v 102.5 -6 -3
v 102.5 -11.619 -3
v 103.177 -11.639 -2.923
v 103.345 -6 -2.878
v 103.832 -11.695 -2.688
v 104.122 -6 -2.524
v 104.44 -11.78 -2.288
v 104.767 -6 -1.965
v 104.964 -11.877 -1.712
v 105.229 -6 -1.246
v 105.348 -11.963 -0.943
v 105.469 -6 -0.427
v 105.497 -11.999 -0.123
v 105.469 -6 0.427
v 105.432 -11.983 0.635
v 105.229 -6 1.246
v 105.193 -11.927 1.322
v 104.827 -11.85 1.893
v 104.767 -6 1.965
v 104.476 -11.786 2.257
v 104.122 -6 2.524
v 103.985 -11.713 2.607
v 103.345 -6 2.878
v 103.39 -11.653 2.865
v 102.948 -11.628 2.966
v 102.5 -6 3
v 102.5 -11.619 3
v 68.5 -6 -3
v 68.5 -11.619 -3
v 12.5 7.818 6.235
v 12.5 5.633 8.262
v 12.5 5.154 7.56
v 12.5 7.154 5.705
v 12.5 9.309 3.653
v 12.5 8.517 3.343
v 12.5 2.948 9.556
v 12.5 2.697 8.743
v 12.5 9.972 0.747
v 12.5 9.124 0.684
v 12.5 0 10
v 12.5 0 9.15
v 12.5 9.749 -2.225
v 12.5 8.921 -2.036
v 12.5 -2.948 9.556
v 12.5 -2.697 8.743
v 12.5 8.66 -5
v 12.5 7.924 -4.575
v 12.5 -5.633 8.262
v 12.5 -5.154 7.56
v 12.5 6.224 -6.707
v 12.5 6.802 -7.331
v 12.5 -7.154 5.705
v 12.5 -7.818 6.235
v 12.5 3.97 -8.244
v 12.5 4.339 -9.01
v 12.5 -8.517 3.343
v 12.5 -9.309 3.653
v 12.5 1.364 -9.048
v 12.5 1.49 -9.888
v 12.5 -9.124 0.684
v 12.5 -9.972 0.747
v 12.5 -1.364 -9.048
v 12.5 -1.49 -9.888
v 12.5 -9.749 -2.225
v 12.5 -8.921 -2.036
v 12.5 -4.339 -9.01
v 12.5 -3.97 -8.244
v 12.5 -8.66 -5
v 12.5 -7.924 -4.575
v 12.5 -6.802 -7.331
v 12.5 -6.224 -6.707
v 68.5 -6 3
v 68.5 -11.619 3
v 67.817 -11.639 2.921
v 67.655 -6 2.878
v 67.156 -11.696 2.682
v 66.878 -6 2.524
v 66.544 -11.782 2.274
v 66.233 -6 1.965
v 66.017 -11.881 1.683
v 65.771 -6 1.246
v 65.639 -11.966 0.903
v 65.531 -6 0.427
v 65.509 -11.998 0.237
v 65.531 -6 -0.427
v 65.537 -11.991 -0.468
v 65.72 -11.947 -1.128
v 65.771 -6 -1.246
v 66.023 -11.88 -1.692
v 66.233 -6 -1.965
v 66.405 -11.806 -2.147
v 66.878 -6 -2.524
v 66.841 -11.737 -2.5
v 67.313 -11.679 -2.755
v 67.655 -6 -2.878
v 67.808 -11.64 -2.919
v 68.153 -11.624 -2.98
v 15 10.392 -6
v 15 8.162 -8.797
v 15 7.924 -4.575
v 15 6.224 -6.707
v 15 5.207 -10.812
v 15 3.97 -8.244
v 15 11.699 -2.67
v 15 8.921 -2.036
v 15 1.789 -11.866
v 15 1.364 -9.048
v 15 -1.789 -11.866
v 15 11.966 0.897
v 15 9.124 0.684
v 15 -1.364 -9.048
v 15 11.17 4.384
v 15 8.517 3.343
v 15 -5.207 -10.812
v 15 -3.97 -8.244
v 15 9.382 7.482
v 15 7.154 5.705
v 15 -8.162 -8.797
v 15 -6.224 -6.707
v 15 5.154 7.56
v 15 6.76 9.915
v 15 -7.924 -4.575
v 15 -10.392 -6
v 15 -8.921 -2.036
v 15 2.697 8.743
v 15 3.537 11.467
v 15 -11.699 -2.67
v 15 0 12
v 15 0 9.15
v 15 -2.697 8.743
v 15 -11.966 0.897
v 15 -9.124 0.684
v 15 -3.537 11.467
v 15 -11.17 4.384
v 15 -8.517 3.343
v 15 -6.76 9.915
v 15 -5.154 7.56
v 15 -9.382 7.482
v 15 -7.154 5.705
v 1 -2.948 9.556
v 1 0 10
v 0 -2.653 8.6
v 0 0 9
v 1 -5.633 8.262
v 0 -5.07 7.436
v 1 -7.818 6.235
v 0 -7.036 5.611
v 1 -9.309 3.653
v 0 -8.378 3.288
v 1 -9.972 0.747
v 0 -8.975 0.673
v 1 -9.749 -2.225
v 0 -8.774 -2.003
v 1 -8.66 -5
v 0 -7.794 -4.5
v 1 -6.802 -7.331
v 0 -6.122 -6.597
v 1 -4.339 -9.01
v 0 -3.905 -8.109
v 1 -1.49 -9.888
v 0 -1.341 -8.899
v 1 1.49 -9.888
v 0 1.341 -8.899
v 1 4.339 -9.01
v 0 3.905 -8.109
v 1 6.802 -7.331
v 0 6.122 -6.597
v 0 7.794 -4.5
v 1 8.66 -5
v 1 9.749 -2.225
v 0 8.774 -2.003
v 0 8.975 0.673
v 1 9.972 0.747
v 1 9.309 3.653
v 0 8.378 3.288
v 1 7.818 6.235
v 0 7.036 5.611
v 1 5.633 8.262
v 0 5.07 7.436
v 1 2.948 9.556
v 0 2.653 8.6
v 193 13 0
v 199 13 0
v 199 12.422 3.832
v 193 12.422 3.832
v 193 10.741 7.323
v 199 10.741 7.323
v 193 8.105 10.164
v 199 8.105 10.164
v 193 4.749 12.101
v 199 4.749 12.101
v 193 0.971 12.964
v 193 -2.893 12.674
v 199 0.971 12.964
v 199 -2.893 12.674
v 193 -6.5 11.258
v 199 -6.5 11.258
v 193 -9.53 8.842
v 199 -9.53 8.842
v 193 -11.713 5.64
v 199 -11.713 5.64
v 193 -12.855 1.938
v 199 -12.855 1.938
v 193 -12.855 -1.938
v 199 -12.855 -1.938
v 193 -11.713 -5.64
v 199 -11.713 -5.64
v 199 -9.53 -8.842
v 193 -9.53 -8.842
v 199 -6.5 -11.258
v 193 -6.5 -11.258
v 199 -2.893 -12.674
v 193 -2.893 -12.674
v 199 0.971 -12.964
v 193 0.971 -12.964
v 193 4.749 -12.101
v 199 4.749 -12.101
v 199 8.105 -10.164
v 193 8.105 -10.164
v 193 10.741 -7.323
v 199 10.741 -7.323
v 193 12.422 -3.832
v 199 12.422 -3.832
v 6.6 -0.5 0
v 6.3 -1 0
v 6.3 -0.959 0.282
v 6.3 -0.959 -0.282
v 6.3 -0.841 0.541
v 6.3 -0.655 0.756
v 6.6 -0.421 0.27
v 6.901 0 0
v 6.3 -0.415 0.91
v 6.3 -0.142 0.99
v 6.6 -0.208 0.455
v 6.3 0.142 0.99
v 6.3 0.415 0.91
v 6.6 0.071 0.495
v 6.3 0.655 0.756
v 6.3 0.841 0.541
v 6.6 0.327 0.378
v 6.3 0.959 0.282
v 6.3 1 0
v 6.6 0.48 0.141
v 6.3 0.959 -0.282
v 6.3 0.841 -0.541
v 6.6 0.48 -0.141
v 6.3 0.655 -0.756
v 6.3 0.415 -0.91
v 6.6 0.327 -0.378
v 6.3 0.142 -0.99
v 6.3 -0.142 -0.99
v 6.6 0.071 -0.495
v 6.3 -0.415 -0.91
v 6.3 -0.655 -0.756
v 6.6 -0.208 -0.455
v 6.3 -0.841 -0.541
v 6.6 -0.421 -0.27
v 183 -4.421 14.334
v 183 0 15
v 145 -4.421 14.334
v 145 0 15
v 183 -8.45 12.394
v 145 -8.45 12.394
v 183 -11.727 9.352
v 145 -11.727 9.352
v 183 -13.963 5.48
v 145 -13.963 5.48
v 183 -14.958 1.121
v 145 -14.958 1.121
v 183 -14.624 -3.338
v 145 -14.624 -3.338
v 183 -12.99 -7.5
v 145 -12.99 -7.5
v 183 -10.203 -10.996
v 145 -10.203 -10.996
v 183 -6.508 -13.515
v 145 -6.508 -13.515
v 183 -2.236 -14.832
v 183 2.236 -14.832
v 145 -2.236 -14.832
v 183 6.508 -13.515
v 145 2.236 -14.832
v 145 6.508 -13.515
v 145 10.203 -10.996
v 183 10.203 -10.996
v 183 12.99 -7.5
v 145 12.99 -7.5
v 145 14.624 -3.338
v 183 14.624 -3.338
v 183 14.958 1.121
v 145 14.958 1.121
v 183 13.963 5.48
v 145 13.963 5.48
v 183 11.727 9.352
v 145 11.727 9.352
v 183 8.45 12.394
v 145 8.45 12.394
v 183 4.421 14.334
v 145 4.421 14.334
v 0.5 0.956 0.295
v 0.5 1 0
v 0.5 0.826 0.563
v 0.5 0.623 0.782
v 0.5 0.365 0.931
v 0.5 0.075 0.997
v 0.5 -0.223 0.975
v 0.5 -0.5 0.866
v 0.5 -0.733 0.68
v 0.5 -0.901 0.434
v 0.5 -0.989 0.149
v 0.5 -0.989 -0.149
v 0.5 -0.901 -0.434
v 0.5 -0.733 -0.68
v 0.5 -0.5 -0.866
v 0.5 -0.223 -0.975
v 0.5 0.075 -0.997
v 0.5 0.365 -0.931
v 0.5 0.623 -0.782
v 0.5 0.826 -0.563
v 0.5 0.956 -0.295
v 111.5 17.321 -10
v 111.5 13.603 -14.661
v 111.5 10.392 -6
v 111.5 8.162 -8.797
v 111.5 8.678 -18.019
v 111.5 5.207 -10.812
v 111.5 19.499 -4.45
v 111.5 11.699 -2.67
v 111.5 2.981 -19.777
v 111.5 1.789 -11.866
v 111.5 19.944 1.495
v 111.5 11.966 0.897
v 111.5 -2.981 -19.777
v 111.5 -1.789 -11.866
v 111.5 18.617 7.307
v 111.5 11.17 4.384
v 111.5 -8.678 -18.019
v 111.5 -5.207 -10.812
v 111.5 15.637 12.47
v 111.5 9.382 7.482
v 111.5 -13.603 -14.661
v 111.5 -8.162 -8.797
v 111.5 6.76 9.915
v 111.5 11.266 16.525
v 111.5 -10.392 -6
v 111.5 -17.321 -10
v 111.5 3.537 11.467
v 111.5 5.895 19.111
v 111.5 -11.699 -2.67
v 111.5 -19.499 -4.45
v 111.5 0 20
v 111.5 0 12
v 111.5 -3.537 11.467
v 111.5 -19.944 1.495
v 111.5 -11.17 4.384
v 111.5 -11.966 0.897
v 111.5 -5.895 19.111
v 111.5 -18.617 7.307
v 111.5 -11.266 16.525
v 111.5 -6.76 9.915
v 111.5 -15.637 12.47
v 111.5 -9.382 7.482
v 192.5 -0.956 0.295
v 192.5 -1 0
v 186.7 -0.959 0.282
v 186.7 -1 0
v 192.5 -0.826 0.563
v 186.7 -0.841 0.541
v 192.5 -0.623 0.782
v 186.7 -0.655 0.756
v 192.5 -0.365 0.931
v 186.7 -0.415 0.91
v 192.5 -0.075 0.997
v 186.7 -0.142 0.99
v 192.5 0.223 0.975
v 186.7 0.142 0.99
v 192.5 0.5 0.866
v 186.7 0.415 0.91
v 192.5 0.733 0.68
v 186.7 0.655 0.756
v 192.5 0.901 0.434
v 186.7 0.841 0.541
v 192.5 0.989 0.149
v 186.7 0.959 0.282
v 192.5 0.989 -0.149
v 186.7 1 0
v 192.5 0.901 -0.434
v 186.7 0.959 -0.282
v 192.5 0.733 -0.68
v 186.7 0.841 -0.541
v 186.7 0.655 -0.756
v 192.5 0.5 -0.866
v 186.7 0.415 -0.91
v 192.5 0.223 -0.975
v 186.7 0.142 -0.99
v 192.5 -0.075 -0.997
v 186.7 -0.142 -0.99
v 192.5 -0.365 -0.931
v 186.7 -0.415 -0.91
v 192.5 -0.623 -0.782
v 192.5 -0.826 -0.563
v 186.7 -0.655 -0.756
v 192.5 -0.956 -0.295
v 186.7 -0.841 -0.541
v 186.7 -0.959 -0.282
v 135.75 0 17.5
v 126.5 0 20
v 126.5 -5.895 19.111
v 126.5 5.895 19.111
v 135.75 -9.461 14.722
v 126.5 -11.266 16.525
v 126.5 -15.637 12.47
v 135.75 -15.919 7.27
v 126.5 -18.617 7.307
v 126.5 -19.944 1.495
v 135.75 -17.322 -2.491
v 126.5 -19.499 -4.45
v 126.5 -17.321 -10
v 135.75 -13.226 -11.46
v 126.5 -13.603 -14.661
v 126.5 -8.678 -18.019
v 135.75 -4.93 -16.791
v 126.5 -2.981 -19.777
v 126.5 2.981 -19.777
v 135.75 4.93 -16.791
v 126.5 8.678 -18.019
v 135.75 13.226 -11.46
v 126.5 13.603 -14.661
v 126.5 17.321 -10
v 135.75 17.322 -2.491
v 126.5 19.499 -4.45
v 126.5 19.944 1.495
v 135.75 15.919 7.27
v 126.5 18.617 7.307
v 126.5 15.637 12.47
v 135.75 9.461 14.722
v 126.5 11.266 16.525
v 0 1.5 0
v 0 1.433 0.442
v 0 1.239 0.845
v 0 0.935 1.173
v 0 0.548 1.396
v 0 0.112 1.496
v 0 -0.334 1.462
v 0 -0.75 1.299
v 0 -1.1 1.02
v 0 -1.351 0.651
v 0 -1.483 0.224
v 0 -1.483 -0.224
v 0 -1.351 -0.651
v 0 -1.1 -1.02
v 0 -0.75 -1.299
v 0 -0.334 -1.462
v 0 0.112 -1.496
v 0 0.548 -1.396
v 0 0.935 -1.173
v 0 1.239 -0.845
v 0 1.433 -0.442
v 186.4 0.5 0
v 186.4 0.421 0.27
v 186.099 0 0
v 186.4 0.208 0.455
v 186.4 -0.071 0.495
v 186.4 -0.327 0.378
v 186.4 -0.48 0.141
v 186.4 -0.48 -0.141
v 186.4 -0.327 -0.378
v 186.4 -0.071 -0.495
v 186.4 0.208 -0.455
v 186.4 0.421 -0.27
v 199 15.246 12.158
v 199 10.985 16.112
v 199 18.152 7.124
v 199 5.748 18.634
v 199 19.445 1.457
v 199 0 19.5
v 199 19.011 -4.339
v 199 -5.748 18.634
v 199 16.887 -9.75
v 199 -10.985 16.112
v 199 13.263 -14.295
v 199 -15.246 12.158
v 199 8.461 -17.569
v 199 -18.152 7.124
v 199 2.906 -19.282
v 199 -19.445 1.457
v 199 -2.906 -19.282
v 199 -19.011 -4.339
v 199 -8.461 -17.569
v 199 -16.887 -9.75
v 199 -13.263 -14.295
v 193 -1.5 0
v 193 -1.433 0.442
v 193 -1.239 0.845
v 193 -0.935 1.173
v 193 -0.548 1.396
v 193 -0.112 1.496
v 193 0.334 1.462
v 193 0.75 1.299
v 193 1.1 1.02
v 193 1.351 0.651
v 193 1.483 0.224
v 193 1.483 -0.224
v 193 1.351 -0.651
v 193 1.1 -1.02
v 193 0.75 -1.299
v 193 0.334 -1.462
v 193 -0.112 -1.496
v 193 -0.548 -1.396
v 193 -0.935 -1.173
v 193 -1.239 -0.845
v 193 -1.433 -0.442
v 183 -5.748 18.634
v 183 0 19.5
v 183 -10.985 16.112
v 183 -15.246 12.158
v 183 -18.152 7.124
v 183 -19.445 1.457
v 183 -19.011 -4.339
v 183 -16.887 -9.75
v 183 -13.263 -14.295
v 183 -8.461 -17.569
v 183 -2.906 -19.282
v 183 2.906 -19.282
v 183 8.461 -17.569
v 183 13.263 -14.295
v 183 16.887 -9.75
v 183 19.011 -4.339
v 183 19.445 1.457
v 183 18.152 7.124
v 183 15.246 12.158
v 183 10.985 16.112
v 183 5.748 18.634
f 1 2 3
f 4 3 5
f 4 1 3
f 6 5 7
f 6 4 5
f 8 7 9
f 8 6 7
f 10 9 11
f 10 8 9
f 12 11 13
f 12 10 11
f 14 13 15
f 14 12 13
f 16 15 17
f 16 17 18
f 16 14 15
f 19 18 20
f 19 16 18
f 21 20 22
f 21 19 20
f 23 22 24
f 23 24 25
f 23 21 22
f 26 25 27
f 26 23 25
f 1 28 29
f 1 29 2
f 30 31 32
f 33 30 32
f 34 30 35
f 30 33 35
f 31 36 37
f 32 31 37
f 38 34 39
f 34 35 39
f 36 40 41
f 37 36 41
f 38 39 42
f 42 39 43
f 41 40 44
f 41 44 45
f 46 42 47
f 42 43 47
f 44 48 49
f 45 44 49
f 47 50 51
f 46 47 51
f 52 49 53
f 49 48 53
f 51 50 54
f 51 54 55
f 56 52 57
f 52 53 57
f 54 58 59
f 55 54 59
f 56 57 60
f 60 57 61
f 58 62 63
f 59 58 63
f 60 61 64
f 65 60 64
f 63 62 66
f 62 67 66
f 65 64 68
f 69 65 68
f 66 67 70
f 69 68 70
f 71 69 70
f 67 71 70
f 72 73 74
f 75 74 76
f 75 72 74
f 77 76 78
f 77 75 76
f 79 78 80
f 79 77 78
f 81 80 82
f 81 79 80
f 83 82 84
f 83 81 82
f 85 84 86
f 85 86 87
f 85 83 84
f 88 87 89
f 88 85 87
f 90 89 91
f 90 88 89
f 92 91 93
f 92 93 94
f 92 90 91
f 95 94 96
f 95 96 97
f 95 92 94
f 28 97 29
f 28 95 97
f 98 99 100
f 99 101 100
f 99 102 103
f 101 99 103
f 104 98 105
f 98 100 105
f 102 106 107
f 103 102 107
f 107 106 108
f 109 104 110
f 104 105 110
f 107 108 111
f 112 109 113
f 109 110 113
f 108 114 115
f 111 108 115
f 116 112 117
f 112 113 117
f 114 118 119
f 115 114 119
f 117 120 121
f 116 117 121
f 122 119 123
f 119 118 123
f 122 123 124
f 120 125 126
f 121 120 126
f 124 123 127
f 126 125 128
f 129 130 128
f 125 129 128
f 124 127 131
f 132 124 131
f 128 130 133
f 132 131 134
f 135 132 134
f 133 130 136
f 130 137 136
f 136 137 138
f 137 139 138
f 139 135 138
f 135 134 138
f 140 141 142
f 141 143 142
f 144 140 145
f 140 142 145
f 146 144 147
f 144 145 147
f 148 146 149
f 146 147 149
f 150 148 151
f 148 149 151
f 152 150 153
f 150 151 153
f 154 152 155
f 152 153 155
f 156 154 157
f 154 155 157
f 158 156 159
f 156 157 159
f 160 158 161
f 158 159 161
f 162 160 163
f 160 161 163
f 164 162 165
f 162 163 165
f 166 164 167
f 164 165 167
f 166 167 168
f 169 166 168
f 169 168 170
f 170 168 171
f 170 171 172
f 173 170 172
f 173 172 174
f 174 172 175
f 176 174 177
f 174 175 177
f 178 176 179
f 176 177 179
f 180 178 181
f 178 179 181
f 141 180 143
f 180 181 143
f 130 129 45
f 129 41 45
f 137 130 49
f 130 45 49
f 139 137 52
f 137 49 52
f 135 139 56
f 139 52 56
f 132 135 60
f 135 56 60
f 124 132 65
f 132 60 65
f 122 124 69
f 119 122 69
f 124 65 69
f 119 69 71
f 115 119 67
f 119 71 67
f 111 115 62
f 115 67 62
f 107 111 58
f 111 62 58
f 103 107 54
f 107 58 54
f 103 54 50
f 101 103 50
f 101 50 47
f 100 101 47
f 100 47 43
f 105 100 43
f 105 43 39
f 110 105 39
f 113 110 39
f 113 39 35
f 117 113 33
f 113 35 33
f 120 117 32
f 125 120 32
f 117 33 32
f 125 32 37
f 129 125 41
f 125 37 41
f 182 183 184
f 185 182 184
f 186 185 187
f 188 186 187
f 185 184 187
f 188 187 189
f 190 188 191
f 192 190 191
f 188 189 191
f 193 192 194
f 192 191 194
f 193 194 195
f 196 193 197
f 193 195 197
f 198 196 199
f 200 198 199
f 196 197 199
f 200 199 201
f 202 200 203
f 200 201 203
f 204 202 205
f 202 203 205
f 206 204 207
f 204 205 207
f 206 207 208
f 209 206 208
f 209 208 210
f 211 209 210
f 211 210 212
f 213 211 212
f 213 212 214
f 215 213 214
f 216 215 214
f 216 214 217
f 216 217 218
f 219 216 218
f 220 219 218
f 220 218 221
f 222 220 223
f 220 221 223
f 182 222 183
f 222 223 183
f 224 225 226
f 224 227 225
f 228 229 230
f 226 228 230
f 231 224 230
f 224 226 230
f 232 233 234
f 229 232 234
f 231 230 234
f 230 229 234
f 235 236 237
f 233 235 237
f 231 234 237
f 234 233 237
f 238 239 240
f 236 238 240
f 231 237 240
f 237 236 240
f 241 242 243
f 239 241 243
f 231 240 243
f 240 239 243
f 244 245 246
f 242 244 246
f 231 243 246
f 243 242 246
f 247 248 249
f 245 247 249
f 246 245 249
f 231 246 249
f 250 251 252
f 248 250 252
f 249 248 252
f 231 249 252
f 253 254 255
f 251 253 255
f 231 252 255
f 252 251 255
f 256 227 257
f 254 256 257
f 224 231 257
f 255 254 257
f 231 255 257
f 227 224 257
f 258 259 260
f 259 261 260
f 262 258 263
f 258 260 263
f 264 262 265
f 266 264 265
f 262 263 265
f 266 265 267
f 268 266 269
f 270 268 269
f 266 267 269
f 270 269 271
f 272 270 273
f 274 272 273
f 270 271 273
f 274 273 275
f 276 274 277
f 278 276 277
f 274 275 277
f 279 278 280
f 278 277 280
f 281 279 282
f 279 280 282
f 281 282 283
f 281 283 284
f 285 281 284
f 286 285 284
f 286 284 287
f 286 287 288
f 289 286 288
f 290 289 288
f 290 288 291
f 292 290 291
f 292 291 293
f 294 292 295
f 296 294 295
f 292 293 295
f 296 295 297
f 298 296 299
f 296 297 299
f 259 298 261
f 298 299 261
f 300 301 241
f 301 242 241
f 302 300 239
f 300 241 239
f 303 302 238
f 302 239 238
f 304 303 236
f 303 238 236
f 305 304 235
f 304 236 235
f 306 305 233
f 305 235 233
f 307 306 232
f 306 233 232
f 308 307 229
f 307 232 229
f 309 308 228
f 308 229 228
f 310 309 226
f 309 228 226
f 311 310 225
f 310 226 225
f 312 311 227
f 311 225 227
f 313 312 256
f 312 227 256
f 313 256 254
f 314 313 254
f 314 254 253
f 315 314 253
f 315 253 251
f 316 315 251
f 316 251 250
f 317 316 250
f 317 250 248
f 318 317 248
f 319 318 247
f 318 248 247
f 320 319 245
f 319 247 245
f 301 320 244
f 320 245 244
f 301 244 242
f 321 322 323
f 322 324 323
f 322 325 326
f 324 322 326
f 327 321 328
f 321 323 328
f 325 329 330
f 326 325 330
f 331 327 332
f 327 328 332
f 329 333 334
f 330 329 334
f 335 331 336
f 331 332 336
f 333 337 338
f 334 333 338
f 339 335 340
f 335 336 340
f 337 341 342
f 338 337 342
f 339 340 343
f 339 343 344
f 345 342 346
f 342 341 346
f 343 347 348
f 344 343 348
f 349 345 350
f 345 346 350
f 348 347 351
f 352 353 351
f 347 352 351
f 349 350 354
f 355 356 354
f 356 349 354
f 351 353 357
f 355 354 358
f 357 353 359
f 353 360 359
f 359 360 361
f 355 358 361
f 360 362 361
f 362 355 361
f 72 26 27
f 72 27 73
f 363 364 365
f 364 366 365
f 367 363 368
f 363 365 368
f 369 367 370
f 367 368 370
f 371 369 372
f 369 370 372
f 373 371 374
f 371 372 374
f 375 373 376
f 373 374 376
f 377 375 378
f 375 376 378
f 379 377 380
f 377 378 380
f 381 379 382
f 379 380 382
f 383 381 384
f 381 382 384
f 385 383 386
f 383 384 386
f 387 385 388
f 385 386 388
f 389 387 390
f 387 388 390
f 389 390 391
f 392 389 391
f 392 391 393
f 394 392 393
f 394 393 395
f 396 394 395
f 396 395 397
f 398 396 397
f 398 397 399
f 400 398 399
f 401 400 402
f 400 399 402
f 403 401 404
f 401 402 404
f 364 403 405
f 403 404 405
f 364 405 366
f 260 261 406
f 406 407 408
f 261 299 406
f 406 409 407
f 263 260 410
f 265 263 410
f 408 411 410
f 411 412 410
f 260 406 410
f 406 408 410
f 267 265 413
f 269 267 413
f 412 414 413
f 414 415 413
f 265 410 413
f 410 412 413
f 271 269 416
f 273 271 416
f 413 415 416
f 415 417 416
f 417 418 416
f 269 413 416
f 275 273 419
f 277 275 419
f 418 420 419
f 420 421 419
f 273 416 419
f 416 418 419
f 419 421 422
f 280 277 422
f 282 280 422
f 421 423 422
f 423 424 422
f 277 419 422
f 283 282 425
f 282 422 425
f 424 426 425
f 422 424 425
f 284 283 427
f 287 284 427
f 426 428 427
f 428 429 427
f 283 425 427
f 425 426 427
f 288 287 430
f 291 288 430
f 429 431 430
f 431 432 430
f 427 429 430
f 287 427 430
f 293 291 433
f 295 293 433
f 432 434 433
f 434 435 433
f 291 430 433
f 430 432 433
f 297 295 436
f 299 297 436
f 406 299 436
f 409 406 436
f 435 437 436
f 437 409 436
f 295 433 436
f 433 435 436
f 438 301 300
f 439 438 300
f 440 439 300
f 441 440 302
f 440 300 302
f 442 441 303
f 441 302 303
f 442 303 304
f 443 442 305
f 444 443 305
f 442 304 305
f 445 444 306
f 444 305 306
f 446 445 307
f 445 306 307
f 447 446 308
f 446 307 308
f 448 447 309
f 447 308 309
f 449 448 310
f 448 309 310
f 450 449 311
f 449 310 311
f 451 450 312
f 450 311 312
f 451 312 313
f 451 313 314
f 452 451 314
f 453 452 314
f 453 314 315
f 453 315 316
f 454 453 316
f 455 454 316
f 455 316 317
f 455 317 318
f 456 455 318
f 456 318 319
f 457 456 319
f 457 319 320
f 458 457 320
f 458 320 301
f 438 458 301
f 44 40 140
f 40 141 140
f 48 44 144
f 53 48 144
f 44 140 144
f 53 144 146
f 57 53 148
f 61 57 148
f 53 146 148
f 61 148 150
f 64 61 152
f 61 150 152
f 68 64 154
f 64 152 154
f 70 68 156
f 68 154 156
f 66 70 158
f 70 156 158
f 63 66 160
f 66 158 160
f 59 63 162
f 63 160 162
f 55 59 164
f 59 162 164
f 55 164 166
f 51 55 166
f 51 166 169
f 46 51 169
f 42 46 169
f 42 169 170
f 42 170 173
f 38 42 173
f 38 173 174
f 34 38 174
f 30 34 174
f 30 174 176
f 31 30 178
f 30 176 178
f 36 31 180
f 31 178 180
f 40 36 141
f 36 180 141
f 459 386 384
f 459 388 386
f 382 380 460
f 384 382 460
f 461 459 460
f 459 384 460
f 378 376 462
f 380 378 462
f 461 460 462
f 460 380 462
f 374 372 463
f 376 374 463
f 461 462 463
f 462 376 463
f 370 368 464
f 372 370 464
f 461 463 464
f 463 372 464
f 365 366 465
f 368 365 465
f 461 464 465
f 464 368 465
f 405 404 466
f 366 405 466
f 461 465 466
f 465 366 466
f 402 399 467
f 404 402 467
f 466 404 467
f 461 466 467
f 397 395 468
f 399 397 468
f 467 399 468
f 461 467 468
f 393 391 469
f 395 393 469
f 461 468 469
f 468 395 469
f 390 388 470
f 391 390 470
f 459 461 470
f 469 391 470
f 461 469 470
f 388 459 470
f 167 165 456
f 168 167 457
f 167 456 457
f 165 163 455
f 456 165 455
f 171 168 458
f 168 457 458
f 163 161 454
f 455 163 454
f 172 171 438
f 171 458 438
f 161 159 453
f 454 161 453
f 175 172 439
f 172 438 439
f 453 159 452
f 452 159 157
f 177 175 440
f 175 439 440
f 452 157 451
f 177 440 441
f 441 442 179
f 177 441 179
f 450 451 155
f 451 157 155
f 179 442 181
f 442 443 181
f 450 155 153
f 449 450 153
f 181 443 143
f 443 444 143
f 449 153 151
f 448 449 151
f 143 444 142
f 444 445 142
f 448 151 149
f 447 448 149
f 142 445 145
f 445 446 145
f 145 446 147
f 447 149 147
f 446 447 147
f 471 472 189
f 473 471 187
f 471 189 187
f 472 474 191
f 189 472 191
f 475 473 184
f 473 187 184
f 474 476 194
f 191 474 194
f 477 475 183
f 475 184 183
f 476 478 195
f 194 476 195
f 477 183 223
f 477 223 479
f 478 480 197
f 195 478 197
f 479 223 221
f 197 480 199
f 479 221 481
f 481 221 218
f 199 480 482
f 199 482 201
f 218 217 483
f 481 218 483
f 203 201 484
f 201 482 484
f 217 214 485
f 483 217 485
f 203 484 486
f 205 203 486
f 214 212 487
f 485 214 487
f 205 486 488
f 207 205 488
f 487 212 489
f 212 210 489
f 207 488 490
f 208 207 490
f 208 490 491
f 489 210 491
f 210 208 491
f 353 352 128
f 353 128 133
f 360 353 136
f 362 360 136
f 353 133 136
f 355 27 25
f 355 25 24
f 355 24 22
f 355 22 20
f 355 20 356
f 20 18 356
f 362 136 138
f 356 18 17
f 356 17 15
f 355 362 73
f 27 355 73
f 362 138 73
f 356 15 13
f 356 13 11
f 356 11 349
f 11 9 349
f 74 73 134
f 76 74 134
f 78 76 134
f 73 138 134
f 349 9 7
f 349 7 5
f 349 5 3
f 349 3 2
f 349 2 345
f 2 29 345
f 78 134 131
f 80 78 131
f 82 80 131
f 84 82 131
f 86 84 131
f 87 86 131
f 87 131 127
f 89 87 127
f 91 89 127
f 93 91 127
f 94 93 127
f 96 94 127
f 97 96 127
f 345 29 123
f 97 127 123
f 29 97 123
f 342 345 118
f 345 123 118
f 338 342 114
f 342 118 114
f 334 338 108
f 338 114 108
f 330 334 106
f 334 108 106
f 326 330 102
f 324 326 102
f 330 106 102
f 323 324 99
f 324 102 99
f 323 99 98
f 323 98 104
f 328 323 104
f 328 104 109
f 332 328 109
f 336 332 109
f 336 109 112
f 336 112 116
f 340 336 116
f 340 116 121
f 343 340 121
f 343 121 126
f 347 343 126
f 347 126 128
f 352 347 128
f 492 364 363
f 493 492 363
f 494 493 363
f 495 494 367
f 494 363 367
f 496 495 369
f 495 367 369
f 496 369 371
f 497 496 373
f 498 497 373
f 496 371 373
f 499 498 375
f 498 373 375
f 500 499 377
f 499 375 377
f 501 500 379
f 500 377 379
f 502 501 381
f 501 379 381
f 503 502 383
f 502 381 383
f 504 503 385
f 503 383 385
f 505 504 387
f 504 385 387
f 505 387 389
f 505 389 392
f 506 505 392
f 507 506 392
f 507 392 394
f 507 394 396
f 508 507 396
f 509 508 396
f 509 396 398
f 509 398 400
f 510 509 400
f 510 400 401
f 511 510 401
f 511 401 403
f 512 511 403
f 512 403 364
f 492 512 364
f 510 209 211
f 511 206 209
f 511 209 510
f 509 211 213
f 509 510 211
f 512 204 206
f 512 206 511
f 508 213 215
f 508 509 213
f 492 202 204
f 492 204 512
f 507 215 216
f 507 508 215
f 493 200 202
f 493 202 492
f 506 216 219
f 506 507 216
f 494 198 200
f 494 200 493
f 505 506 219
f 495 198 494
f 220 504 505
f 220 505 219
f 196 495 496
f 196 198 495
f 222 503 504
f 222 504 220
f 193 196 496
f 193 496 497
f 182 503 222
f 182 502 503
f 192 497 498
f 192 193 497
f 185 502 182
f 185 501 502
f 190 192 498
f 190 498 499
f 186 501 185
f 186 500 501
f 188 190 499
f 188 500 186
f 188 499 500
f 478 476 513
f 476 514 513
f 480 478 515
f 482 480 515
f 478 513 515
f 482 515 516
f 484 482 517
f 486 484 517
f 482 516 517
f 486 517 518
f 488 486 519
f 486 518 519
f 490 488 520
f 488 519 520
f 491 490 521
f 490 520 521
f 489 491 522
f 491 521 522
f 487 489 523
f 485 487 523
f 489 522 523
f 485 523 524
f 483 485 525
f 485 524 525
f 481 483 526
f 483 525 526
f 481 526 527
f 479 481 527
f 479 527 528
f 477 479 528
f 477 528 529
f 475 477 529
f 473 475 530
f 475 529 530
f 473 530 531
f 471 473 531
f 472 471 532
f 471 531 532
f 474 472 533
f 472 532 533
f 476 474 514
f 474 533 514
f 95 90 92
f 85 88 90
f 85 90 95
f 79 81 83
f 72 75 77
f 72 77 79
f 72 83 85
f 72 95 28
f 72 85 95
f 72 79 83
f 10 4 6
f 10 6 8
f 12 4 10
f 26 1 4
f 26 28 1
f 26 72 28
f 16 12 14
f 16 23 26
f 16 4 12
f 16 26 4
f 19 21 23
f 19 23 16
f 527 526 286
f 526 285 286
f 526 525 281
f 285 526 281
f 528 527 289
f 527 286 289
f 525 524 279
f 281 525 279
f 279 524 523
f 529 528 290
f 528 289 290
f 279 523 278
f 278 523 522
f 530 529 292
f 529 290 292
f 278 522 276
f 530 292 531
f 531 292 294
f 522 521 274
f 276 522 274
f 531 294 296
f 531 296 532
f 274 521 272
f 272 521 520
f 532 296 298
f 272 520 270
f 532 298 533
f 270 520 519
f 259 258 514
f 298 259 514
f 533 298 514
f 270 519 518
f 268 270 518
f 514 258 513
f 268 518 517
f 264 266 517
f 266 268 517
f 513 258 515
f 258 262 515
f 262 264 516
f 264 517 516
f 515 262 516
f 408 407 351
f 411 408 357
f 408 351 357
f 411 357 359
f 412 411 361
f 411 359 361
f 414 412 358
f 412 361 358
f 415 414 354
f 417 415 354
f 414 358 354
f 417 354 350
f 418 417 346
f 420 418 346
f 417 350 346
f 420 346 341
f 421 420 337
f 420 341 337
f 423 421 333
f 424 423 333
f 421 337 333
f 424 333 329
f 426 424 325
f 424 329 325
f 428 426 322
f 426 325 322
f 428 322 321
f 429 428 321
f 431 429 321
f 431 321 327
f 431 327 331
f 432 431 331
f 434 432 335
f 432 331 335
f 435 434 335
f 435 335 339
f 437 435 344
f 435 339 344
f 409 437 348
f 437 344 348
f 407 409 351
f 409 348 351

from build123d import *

# Parameters (mm, degrees)
F3_START             = 6
F3_DEPTH             = 9.4
F4_R                 = 13
F5_DEPTH             = 6
F8_D                 = 2
F8_DEPTH             = 6.3
F8_CSINK_D           = 3
F8_CSINK_ANGLE       = 90
F8_TIP               = 0.600860619
F8_ON_F6_D           = 2
F8_ON_F6_DEPTH       = 6.3
F8_ON_F6_CSINK_D     = 3
F8_ON_F6_CSINK_ANGLE = 90
F8_ON_F6_TIP         = 0.600860619


with BuildPart() as f1:
    # F0 (on Front) → F1 (revolve)
    with BuildSketch(Plane.XZ):
        Polygon((1, 10), (0, 9), (0, 0), (183, 0), (183, 15), (145, 15), (126.5, 20), (111.5, 20), (111.5, 12), (15, 12), (15, 9.15), (12.5, 9.15), (12.5, 10), align=None)
        Polygon((183, 15), (183, 0), (199, 0), (199, 19.5), (183, 19.5), align=None)
    revolve(axis=Axis((105.2958741784, 0, 0), (1, 0, 0)))

    # F2 (on Front) → F3 (cut)
    with BuildSketch(Plane.XZ.offset(F3_START)):
        with BuildLine():
            ThreePointArc((102.5, -3), (105.5, 0), (102.5, 3))
            Line((102.5, 3), (68.5, 3))
            ThreePointArc((68.5, 3), (65.5, 0), (68.5, -3))
            Line((68.5, -3), (102.5, -3))
        make_face()
    extrude(amount=F3_DEPTH, mode=Mode.SUBTRACT)

    # F4 (on face) → F5 (cut)
    with BuildSketch(Plane.YZ.offset(199)):
        Circle(F4_R)
    extrude(amount=-F5_DEPTH, mode=Mode.SUBTRACT)

    # F8
    with Locations(Plane(origin=(0, 0, 0), x_dir=(0, -1, 0), z_dir=(-1, 0, 0))):
        with Locations((0, 0)):
            CounterSinkHole(F8_D / 2, F8_CSINK_D / 2, depth=F8_DEPTH, counter_sink_angle=F8_CSINK_ANGLE)
            with Locations((0, 0, -(F8_DEPTH + F8_TIP / 2))):  # 118° drill point
                Cone(0, F8_D / 2, F8_TIP, mode=Mode.SUBTRACT)

    # F8 on F6
    with Locations(Plane.YZ.offset(193)):
        with Locations((0, 0)):
            CounterSinkHole(F8_ON_F6_D / 2, F8_ON_F6_CSINK_D / 2, depth=F8_ON_F6_DEPTH, counter_sink_angle=F8_ON_F6_CSINK_ANGLE)
            with Locations((0, 0, -(F8_ON_F6_DEPTH + F8_ON_F6_TIP / 2))):  # 118° drill point
                Cone(0, F8_ON_F6_D / 2, F8_ON_F6_TIP, mode=Mode.SUBTRACT)


solid = f1.part
